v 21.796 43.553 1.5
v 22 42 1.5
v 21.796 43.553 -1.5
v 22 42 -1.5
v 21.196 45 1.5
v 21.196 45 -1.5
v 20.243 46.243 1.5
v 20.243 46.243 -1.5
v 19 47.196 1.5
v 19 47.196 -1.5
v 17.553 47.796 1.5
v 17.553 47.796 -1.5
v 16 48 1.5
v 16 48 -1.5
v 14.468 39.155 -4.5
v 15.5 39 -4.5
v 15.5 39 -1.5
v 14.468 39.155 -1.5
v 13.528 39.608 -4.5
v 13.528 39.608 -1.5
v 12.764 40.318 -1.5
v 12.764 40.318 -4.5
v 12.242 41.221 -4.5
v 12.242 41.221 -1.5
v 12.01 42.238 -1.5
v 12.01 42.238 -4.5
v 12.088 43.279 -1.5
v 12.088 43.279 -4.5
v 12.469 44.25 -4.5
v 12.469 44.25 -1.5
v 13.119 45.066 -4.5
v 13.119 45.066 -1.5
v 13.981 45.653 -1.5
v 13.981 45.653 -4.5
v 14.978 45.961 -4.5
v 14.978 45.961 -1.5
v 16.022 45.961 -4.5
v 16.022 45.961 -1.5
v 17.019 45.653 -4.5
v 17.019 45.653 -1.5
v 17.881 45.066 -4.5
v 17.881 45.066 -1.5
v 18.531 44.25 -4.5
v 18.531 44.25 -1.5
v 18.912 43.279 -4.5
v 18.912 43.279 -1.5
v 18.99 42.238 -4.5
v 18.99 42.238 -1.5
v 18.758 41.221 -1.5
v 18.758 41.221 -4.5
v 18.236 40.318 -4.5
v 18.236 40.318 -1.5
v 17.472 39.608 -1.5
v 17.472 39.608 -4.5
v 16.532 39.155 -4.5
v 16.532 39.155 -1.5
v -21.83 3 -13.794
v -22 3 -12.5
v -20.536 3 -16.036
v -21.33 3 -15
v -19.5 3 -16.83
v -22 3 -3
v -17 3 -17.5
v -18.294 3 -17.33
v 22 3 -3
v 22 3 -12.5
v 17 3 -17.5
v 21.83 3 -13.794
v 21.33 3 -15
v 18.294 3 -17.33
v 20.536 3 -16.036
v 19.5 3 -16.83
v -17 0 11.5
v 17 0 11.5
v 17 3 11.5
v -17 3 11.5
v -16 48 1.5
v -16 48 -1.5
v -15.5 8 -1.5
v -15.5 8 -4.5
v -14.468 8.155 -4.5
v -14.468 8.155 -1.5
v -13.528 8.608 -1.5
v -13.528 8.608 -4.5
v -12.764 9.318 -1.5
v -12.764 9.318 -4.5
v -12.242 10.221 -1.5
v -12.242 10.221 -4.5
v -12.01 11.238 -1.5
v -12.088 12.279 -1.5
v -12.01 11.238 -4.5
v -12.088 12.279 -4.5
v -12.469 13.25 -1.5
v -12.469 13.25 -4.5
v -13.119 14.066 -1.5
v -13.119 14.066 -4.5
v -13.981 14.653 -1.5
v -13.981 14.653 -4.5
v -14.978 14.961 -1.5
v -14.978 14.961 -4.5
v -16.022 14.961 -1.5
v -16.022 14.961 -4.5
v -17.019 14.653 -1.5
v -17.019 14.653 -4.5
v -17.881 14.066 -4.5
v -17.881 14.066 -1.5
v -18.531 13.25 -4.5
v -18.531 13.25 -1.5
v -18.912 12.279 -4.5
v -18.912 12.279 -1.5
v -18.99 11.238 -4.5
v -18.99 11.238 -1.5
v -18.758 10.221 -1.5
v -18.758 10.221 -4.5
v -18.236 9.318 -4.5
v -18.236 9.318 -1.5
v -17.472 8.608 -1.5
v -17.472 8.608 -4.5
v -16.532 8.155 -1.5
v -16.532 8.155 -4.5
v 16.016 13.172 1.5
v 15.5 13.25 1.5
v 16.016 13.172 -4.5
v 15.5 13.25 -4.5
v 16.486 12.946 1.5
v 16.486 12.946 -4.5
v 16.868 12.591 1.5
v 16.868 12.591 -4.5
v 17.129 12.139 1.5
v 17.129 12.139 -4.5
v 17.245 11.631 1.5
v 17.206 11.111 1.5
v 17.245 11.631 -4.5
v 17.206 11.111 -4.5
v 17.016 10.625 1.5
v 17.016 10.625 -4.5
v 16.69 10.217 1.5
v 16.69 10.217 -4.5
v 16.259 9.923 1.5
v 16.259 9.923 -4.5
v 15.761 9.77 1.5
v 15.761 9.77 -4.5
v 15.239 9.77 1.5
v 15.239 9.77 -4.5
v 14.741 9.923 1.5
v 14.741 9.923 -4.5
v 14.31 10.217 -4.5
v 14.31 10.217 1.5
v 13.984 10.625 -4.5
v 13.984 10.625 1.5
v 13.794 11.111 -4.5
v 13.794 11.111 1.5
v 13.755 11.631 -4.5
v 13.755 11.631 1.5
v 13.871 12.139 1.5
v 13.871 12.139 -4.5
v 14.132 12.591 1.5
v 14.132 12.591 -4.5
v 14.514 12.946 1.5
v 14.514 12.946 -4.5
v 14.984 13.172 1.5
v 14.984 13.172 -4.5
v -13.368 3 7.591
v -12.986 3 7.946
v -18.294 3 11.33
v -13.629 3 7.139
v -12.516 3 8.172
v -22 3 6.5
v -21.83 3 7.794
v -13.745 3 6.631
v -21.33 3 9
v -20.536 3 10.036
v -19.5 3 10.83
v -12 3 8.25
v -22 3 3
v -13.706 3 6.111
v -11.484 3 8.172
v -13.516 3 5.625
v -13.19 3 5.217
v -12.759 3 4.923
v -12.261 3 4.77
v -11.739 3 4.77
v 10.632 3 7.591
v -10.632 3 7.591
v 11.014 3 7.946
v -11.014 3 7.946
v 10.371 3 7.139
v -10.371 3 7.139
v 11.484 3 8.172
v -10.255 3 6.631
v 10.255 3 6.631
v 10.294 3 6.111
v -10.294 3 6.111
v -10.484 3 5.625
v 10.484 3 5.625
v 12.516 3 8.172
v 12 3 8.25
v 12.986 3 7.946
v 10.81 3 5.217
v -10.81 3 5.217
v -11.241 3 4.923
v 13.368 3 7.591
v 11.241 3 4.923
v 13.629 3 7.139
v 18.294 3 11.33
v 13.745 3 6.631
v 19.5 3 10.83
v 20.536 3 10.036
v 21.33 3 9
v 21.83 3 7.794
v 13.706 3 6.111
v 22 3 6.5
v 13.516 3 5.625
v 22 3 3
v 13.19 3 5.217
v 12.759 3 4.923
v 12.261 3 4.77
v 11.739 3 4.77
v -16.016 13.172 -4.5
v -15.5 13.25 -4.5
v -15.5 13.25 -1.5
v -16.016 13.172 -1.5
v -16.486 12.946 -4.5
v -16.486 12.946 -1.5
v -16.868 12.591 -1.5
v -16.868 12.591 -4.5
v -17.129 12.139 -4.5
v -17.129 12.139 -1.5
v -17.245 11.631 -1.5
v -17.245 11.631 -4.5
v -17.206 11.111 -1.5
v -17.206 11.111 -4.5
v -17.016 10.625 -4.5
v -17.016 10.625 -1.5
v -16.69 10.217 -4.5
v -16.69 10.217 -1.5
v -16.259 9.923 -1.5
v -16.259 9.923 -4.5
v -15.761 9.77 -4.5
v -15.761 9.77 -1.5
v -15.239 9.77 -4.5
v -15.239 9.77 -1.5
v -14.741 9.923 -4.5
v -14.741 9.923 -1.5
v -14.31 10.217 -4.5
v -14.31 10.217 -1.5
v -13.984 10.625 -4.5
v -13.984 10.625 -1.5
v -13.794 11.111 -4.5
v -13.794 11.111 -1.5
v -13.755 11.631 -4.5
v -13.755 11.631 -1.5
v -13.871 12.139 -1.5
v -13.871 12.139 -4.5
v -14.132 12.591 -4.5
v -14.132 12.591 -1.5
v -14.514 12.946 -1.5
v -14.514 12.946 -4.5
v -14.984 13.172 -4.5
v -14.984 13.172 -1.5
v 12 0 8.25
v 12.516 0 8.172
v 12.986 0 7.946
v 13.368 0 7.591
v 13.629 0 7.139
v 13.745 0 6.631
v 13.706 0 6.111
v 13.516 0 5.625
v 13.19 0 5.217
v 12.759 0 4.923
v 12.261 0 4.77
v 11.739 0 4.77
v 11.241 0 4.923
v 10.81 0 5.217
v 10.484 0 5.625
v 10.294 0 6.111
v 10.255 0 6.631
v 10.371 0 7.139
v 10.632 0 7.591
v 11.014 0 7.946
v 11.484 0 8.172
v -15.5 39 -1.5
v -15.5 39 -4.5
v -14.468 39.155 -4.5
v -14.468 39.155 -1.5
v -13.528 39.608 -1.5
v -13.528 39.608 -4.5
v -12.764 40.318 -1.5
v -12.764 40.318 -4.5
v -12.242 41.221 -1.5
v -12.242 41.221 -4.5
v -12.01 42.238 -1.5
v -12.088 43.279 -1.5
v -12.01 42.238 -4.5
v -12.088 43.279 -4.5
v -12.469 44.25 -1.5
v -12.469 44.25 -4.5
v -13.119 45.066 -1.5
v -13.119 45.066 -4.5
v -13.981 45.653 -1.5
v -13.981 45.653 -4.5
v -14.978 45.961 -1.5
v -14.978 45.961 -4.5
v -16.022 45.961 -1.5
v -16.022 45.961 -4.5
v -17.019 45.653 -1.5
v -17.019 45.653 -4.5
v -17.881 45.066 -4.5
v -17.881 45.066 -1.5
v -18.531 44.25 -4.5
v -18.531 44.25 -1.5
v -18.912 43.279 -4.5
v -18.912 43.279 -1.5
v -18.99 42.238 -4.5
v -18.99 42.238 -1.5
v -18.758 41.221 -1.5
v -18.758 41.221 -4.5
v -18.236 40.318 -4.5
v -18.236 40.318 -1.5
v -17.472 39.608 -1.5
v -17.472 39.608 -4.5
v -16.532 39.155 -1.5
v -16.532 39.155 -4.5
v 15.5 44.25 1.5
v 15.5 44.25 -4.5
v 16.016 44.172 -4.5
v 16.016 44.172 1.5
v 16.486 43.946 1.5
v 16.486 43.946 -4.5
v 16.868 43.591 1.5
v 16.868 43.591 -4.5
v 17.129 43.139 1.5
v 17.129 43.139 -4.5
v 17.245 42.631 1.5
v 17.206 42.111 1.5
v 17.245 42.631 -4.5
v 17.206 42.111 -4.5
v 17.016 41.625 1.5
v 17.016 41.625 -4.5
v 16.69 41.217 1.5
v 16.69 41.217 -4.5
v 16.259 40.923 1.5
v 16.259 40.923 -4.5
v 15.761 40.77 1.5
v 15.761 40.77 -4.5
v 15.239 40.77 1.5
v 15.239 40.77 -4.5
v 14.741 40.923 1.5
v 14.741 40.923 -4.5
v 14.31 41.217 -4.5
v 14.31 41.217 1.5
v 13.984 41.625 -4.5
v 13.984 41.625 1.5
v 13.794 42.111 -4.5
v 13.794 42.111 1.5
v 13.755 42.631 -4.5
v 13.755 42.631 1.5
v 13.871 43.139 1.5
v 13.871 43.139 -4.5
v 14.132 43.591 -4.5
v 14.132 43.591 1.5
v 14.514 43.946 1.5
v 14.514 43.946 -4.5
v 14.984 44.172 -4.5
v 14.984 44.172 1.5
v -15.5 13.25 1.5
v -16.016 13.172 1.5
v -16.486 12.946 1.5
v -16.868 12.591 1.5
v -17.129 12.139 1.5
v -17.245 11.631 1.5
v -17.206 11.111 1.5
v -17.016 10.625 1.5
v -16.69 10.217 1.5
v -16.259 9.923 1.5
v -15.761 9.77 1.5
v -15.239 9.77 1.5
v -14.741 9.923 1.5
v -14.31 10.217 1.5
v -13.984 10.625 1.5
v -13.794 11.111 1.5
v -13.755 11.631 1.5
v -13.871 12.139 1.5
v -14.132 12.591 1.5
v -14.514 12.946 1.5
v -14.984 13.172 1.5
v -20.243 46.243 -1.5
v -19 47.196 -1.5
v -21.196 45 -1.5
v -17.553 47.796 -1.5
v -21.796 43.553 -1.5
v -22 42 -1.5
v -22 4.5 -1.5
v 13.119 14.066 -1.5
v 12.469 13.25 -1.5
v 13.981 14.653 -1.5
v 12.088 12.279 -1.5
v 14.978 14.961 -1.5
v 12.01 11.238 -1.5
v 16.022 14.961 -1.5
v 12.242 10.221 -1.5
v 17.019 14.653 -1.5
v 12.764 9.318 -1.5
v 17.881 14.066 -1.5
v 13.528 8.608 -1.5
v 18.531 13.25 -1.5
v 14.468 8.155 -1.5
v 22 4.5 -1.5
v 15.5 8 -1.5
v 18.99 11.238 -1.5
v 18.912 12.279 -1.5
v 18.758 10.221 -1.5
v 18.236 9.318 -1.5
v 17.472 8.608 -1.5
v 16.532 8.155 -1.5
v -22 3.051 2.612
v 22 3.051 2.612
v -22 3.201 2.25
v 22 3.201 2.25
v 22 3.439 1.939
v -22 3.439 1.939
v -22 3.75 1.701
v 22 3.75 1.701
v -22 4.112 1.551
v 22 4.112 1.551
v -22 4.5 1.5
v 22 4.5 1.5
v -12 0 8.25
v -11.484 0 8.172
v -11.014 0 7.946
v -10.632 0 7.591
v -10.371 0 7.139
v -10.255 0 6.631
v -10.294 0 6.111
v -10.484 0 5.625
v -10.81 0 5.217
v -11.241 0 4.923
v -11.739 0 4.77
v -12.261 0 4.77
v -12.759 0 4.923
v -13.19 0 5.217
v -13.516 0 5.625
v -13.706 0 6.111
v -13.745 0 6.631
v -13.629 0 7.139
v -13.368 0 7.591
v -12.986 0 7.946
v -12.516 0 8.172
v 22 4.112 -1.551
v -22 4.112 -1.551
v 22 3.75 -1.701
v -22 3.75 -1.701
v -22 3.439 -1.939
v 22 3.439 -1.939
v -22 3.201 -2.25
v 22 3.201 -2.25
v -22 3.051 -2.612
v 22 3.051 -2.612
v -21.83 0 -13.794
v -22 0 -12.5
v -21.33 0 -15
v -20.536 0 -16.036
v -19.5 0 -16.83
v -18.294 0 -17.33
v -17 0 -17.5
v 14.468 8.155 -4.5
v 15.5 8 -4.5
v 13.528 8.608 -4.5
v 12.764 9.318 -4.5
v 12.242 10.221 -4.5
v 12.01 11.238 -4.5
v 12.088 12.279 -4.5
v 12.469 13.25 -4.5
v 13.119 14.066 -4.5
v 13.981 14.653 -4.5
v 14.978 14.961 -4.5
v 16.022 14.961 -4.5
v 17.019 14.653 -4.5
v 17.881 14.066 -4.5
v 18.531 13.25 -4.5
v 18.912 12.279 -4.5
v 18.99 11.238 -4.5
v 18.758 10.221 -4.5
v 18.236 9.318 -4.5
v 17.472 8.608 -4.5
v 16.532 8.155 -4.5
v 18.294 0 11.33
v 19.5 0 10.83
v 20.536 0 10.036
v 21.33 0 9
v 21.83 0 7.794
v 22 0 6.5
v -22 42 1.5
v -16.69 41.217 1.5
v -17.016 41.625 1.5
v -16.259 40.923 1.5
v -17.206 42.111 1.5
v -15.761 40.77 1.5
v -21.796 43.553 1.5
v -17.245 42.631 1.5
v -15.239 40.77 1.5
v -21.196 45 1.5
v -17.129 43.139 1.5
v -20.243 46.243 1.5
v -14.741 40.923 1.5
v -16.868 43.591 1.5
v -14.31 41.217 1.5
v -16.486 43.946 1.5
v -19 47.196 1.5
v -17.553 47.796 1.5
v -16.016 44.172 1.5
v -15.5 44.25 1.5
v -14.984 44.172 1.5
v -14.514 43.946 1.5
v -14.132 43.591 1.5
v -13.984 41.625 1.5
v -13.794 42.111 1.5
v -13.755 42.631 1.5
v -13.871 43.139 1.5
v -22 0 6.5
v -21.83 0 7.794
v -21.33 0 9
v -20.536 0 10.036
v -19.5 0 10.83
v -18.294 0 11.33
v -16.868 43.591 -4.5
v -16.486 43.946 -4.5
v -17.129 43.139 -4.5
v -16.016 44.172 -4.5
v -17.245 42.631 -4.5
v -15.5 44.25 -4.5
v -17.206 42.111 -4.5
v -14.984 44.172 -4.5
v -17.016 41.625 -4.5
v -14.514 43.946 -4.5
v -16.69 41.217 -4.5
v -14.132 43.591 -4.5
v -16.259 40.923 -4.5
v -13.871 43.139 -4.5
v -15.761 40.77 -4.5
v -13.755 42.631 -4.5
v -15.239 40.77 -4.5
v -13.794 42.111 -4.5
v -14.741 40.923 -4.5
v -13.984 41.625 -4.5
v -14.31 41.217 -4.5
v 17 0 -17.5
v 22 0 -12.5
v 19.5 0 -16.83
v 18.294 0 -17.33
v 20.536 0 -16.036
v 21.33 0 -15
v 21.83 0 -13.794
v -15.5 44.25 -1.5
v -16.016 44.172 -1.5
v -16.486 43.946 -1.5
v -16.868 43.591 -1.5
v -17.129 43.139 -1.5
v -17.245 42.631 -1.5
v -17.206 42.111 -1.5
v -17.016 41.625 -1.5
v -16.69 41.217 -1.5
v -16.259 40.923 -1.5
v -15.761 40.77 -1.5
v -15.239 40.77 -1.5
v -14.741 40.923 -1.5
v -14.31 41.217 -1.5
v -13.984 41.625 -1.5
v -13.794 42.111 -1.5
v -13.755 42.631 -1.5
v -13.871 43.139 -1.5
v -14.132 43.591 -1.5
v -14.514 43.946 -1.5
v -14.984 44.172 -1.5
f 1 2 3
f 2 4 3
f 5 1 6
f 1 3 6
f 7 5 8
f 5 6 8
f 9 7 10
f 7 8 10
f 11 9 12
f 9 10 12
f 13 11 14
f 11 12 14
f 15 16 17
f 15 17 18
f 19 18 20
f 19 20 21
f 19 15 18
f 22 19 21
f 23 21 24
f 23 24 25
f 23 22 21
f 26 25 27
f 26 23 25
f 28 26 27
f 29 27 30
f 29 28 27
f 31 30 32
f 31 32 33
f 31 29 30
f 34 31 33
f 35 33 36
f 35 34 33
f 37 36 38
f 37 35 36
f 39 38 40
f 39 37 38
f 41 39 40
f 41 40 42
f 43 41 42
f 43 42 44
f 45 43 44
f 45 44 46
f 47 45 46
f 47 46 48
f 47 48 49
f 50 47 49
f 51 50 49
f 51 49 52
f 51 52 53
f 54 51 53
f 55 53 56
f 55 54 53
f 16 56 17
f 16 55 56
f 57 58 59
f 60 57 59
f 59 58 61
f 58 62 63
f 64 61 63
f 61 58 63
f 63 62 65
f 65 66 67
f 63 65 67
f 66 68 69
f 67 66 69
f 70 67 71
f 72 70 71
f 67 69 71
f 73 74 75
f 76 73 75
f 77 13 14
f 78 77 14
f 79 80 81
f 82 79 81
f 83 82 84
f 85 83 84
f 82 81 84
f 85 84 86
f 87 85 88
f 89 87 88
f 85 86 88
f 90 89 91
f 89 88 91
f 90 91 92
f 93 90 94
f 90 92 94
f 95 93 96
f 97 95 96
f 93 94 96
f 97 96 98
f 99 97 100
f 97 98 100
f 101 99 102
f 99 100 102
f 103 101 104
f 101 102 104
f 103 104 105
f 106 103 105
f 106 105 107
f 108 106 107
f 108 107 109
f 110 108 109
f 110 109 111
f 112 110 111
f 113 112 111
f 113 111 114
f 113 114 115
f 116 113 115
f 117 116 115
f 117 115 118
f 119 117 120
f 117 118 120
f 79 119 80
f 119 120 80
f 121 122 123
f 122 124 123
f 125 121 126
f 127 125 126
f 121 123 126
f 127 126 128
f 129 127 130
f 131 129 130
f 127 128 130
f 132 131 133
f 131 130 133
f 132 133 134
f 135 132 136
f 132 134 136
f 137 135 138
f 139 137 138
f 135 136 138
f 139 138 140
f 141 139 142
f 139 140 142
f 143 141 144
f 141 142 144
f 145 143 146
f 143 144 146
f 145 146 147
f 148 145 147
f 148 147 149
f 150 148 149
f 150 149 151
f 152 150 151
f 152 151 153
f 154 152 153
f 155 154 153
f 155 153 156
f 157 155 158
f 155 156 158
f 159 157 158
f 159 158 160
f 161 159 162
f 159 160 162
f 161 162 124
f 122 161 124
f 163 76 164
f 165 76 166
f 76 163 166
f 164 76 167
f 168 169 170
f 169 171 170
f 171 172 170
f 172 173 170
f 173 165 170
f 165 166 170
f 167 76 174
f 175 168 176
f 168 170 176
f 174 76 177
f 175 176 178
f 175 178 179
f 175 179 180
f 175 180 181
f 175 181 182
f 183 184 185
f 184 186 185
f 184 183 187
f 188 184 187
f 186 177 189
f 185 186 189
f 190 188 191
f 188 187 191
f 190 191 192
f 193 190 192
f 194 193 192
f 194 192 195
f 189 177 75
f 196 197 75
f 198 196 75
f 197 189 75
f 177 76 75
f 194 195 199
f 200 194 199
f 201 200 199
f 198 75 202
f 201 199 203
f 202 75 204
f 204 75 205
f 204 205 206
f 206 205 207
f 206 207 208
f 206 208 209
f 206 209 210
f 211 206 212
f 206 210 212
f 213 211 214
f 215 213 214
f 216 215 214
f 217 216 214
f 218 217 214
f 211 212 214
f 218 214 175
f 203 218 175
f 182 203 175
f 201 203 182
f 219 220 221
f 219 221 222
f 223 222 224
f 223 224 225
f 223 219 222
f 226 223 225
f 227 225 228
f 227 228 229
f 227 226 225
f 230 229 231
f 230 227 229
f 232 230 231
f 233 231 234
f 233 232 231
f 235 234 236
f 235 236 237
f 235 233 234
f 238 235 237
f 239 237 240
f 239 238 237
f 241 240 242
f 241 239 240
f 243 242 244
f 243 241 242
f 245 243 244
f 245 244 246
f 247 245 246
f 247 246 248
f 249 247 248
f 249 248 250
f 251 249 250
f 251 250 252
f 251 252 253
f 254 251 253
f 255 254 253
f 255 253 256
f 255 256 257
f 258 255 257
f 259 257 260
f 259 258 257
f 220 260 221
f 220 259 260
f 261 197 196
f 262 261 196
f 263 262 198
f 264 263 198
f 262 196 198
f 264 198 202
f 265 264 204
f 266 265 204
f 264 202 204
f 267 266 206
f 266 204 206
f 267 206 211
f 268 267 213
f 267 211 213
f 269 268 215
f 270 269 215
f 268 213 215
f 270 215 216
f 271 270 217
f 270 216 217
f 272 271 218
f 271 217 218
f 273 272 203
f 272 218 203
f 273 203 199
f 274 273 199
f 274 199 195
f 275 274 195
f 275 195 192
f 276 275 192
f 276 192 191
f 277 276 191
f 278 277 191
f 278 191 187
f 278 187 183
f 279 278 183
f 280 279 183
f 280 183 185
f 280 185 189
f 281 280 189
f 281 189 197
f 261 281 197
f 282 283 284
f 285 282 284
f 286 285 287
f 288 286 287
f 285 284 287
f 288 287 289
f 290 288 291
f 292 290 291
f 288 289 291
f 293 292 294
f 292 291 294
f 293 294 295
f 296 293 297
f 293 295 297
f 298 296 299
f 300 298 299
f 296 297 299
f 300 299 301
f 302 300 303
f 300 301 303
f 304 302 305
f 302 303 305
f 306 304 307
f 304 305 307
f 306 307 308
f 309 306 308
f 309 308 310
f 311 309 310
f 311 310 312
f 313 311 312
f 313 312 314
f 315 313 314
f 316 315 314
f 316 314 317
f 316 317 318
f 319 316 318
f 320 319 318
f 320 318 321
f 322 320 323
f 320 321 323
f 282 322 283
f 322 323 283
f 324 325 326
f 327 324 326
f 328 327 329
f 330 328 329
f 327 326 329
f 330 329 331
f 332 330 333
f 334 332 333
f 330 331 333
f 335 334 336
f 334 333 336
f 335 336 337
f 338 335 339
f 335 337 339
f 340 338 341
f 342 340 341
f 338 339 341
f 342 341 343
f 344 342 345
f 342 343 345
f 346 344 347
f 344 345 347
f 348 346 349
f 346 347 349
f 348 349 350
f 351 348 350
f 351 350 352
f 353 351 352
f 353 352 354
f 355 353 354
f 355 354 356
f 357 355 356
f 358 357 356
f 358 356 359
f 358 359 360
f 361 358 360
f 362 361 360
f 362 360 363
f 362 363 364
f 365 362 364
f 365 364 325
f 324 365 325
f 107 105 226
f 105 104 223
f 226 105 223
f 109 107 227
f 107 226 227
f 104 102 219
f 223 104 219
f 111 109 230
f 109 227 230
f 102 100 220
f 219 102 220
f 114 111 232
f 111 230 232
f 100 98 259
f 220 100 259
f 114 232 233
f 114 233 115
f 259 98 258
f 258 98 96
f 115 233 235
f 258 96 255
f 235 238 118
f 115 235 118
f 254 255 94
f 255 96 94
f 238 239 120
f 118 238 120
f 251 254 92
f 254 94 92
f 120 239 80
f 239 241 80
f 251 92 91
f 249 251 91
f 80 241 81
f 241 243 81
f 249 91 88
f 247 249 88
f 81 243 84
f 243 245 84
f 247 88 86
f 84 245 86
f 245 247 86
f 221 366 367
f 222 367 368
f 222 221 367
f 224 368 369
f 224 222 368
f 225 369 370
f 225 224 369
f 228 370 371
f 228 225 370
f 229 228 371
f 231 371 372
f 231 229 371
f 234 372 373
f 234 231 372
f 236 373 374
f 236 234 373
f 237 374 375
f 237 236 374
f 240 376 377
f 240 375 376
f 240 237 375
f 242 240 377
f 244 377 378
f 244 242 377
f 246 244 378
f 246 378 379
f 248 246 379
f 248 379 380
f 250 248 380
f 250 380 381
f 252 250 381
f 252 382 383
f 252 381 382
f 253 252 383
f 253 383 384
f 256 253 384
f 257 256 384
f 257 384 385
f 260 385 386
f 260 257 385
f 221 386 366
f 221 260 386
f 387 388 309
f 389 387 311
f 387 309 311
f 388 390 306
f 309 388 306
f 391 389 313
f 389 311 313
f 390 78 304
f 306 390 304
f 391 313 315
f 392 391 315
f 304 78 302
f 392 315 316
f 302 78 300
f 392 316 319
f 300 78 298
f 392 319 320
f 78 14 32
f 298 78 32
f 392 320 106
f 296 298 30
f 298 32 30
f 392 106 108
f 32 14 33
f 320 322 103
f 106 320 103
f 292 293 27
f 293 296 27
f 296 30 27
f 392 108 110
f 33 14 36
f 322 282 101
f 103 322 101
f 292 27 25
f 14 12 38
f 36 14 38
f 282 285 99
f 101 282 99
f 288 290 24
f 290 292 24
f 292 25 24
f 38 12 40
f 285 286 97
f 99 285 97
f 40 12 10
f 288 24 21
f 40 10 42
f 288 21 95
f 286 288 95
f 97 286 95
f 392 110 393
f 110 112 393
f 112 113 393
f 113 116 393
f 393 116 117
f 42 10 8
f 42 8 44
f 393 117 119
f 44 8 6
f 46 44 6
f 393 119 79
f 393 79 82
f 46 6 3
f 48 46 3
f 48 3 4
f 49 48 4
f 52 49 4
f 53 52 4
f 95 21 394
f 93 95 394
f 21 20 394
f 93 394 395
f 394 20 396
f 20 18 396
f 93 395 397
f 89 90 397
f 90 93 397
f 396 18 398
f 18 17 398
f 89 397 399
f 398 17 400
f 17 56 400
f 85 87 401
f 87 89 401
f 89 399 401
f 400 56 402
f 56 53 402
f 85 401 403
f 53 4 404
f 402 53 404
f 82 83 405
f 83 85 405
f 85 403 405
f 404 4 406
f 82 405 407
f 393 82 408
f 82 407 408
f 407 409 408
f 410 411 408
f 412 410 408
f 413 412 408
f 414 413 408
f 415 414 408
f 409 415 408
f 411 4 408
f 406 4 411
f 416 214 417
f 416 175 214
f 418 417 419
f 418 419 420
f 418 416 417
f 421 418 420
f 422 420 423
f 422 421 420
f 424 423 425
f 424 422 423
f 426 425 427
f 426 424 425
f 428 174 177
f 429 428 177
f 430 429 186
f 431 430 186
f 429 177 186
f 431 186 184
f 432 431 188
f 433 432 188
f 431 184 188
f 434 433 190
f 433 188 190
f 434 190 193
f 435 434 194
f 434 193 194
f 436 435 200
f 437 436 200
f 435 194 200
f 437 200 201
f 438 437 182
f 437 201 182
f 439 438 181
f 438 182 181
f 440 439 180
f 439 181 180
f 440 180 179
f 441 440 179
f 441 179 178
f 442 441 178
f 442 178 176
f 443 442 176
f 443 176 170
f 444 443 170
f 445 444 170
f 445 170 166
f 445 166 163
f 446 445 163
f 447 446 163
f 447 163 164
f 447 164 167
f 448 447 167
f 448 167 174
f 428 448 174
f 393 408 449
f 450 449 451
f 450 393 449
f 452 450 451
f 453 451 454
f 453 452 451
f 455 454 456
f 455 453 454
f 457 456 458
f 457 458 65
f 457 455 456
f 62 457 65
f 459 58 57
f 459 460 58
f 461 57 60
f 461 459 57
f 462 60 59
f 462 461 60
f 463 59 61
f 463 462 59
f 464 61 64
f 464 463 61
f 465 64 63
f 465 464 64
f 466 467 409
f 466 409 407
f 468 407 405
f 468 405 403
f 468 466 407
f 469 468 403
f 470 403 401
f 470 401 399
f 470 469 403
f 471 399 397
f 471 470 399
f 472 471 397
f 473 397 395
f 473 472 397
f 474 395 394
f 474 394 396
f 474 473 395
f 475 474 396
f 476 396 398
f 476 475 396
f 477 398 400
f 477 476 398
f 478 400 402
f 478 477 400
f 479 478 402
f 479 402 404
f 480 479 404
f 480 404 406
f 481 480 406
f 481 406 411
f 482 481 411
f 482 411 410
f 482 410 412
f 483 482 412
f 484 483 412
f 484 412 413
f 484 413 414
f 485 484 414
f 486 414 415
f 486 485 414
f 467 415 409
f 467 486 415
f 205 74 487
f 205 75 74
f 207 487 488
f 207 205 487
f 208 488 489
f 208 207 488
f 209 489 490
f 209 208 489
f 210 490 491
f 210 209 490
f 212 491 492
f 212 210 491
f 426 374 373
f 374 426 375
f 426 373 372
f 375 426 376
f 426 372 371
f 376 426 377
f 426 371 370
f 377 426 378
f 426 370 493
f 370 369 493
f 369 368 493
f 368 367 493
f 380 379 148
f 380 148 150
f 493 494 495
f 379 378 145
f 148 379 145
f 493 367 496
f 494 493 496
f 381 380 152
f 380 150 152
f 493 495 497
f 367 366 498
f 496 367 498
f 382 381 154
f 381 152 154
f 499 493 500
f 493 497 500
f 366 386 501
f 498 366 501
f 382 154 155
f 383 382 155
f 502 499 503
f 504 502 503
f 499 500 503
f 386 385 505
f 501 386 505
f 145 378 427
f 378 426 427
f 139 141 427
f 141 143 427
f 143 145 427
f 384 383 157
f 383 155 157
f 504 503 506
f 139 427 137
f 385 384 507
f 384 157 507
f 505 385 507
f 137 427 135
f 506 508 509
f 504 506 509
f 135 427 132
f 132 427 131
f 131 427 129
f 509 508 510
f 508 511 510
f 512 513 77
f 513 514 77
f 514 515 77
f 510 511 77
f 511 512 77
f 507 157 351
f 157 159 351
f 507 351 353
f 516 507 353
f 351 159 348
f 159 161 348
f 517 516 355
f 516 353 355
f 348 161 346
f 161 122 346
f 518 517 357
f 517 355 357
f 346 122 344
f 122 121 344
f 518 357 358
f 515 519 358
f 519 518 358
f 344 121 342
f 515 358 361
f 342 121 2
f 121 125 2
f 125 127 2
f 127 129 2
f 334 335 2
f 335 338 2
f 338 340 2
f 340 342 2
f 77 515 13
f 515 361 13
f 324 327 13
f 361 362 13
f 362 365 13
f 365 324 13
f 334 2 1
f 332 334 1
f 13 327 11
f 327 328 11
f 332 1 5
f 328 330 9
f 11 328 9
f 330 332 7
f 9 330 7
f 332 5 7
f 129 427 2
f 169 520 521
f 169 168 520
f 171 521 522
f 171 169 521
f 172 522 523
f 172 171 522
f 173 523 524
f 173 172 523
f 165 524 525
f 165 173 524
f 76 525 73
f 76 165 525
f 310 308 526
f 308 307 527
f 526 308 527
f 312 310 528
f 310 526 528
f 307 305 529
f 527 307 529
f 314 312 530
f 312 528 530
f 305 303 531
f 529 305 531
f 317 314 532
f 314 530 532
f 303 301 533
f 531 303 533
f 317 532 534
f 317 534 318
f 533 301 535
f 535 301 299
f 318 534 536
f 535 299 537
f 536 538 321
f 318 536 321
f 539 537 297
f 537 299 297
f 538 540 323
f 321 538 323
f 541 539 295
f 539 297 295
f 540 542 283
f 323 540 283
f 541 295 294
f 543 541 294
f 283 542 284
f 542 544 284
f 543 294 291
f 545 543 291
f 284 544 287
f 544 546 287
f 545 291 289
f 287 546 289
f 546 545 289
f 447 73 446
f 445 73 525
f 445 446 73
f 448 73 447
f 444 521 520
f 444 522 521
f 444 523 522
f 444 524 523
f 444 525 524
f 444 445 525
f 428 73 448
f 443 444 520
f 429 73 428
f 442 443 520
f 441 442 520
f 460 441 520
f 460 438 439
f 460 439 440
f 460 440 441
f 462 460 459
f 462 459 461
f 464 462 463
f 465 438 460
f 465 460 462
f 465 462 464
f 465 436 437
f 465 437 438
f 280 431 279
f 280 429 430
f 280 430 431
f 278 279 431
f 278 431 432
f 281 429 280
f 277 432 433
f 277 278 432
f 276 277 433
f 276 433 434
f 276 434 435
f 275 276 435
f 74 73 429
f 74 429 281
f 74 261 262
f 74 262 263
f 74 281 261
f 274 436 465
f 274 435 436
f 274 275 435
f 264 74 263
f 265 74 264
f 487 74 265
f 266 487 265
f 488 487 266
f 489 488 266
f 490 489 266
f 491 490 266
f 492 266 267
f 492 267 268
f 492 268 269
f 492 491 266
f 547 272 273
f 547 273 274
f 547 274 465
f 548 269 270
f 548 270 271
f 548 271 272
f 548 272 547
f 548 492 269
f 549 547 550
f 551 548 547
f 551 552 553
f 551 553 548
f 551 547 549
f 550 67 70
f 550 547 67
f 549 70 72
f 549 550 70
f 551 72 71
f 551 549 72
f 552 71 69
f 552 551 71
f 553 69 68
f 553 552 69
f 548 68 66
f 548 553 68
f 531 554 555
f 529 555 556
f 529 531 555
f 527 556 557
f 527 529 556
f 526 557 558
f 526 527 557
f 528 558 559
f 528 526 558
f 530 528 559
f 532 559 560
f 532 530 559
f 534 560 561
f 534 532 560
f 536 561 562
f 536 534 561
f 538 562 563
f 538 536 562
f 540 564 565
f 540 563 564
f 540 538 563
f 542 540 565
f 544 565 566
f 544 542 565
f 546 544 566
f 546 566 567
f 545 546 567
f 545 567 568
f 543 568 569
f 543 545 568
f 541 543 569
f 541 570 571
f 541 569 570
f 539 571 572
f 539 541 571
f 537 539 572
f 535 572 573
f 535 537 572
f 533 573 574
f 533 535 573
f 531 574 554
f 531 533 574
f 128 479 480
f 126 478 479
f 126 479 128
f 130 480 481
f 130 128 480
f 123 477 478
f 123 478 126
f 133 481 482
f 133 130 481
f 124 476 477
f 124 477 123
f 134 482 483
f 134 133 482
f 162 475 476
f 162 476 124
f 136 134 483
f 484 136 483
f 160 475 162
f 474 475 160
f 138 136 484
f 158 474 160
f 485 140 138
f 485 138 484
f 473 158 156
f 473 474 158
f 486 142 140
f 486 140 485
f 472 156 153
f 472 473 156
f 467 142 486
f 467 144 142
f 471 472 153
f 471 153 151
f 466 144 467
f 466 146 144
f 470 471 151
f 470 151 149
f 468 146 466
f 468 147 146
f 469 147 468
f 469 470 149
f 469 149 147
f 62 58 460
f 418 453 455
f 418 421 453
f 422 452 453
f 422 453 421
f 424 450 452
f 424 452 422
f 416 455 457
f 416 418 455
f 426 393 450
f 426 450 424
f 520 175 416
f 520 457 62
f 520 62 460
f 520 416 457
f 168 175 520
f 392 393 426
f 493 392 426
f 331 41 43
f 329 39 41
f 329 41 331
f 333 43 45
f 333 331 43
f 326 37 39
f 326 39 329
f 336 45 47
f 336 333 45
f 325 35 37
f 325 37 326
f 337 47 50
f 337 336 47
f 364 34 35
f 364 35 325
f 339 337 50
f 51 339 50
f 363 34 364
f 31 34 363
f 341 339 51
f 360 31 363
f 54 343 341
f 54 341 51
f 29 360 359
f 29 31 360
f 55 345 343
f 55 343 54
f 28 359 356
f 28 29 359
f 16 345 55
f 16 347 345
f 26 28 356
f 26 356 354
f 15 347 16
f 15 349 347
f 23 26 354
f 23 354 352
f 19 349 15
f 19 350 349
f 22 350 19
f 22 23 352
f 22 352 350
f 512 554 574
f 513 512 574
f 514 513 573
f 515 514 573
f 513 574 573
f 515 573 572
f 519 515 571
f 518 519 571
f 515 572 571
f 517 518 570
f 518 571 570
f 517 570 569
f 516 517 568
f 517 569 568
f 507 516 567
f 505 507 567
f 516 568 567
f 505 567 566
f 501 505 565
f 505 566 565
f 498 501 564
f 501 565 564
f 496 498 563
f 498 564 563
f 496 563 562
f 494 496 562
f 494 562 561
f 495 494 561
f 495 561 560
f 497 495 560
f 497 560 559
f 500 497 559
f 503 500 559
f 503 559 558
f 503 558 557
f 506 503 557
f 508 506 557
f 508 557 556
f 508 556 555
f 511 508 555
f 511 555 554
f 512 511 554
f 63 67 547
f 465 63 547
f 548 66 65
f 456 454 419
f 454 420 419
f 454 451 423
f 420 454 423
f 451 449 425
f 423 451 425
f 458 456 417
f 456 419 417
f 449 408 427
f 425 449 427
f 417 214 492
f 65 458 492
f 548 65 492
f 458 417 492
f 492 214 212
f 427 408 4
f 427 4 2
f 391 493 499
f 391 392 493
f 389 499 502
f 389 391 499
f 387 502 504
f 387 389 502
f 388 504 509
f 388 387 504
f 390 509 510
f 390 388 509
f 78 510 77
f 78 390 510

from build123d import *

# Parameters (mm, degrees)
SALIENTE_EXTRUIR1_DEPTH = 22
CROQUIS4_R              = 1.75
CORTAR_EXTRUIR1_DEPTH   = 56.172456897
CROQUIS5_R              = 1.75
CORTAR_EXTRUIR2_DEPTH   = 54.058929503
REDONDEO1_R             = 6
REDONDEO2_R             = 5
REDONDEO3_R             = 1.5
SALIENTE_EXTRUIR2_START = 3
CROQUIS6_R              = 3.5
CROQUIS6_R_2            = 1.75
SALIENTE_EXTRUIR2_DEPTH = 3


with BuildPart() as part:
    # Croquis3 → Saliente-Extruir1 (new, symmetric)
    with BuildSketch(Plane(origin=(0, 0, 0), x_dir=(0, 0, -1), z_dir=(1, 0, 0))):
        Polygon((-11.5, 0), (-11.5, 3), (-1.5, 3), (-1.5, 48), (1.5, 48), (1.5, 3), (17.5, 3), (17.5, 0), (0, 0), align=None)
    extrude(amount=SALIENTE_EXTRUIR1_DEPTH, both=True)

    # Croquis4 → Cortar-Extruir1 (cut, through all)
    with BuildSketch(Plane(origin=(0, 0, -1.5), x_dir=(-1, 0, 0), z_dir=(0, 0, -1))):
        with Locations(Location((15.5, 42.5, 0), (0, 0, 90))):
            Circle(CROQUIS4_R)
        with Locations(Location((-15.5, 11.5, 0), (0, 0, 90))):
            Circle(CROQUIS4_R)
    cortar_extruir1 = extrude(amount=-CORTAR_EXTRUIR1_DEPTH, mode=Mode.SUBTRACT)

    # Simetría1: Cortar-Extruir1 across plane
    add(cortar_extruir1.mirror(Plane(origin=(0, 0, 0), x_dir=(0, 0, 1), z_dir=(1, 0, 0))), mode=Mode.SUBTRACT)

    # Croquis5 → Cortar-Extruir2 (cut, through all)
    with BuildSketch(Plane(origin=(0, 3, 0), x_dir=(1, 0, 0), z_dir=(0, 1, 0))):
        with Locations(Location((-12, -6.5, 0), (0, 0, 270))):
            Circle(CROQUIS5_R)
        with Locations(Location((12, -6.5, 0), (0, 0, 270))):
            Circle(CROQUIS5_R)
    extrude(amount=-CORTAR_EXTRUIR2_DEPTH, mode=Mode.SUBTRACT)

    # Redondeo1
    redondeo1_edges = [part.edges().sort_by_distance(p)[0] for p in [
        (-22, 48, 0),
        (22, 48, 0),
    ]]
    fillet(redondeo1_edges, radius=REDONDEO1_R)

    # Redondeo2
    redondeo2_edges = [part.edges().sort_by_distance(p)[0] for p in [
        (-22, 1.5, 11.5),
        (-22, 1.5, -17.5),
        (22, 1.5, 11.5),
        (22, 1.5, -17.5),
    ]]
    fillet(redondeo2_edges, radius=REDONDEO2_R)

    # Redondeo3
    redondeo3_edges = [part.edges().sort_by_distance(p)[0] for p in [
        (0, 3, 1.5),
        (0, 3, -1.5),
    ]]
    fillet(redondeo3_edges, radius=REDONDEO3_R)

    # Croquis6 → Saliente-Extruir2 (add)
    # profile 1 of 2: a face of its own
    with BuildSketch(Plane(origin=(0, 0, -1.5), x_dir=(-1, 0, 0), z_dir=(0, 0, -1)).offset(SALIENTE_EXTRUIR2_START)):
        with Locations(Location((-15.5, 42.5, 0), (0, 0, 270))):
            Circle(CROQUIS6_R)
        with Locations(Location((-15.5, 42.5, 0), (0, 0, 90))):
            Circle(CROQUIS6_R_2, mode=Mode.SUBTRACT)
    # profile 2 of 2: a face of its own
    with BuildSketch(Plane(origin=(0, 0, -1.5), x_dir=(-1, 0, 0), z_dir=(0, 0, -1)).offset(SALIENTE_EXTRUIR2_START)):
        with Locations(Location((-15.5, 11.5, 0), (0, 0, 270))):
            Circle(CROQUIS6_R)
        with Locations(Location((-15.5, 11.5, 0), (0, 0, 90))):
            Circle(CROQUIS6_R_2, mode=Mode.SUBTRACT)
    saliente_extruir2 = extrude(amount=-SALIENTE_EXTRUIR2_DEPTH)

    # Simetría2: Saliente-Extruir2 across plane
    add(saliente_extruir2.mirror(Plane(origin=(0, 0, 0), x_dir=(0, 0, 1), z_dir=(1, 0, 0))))


solid = part.part
